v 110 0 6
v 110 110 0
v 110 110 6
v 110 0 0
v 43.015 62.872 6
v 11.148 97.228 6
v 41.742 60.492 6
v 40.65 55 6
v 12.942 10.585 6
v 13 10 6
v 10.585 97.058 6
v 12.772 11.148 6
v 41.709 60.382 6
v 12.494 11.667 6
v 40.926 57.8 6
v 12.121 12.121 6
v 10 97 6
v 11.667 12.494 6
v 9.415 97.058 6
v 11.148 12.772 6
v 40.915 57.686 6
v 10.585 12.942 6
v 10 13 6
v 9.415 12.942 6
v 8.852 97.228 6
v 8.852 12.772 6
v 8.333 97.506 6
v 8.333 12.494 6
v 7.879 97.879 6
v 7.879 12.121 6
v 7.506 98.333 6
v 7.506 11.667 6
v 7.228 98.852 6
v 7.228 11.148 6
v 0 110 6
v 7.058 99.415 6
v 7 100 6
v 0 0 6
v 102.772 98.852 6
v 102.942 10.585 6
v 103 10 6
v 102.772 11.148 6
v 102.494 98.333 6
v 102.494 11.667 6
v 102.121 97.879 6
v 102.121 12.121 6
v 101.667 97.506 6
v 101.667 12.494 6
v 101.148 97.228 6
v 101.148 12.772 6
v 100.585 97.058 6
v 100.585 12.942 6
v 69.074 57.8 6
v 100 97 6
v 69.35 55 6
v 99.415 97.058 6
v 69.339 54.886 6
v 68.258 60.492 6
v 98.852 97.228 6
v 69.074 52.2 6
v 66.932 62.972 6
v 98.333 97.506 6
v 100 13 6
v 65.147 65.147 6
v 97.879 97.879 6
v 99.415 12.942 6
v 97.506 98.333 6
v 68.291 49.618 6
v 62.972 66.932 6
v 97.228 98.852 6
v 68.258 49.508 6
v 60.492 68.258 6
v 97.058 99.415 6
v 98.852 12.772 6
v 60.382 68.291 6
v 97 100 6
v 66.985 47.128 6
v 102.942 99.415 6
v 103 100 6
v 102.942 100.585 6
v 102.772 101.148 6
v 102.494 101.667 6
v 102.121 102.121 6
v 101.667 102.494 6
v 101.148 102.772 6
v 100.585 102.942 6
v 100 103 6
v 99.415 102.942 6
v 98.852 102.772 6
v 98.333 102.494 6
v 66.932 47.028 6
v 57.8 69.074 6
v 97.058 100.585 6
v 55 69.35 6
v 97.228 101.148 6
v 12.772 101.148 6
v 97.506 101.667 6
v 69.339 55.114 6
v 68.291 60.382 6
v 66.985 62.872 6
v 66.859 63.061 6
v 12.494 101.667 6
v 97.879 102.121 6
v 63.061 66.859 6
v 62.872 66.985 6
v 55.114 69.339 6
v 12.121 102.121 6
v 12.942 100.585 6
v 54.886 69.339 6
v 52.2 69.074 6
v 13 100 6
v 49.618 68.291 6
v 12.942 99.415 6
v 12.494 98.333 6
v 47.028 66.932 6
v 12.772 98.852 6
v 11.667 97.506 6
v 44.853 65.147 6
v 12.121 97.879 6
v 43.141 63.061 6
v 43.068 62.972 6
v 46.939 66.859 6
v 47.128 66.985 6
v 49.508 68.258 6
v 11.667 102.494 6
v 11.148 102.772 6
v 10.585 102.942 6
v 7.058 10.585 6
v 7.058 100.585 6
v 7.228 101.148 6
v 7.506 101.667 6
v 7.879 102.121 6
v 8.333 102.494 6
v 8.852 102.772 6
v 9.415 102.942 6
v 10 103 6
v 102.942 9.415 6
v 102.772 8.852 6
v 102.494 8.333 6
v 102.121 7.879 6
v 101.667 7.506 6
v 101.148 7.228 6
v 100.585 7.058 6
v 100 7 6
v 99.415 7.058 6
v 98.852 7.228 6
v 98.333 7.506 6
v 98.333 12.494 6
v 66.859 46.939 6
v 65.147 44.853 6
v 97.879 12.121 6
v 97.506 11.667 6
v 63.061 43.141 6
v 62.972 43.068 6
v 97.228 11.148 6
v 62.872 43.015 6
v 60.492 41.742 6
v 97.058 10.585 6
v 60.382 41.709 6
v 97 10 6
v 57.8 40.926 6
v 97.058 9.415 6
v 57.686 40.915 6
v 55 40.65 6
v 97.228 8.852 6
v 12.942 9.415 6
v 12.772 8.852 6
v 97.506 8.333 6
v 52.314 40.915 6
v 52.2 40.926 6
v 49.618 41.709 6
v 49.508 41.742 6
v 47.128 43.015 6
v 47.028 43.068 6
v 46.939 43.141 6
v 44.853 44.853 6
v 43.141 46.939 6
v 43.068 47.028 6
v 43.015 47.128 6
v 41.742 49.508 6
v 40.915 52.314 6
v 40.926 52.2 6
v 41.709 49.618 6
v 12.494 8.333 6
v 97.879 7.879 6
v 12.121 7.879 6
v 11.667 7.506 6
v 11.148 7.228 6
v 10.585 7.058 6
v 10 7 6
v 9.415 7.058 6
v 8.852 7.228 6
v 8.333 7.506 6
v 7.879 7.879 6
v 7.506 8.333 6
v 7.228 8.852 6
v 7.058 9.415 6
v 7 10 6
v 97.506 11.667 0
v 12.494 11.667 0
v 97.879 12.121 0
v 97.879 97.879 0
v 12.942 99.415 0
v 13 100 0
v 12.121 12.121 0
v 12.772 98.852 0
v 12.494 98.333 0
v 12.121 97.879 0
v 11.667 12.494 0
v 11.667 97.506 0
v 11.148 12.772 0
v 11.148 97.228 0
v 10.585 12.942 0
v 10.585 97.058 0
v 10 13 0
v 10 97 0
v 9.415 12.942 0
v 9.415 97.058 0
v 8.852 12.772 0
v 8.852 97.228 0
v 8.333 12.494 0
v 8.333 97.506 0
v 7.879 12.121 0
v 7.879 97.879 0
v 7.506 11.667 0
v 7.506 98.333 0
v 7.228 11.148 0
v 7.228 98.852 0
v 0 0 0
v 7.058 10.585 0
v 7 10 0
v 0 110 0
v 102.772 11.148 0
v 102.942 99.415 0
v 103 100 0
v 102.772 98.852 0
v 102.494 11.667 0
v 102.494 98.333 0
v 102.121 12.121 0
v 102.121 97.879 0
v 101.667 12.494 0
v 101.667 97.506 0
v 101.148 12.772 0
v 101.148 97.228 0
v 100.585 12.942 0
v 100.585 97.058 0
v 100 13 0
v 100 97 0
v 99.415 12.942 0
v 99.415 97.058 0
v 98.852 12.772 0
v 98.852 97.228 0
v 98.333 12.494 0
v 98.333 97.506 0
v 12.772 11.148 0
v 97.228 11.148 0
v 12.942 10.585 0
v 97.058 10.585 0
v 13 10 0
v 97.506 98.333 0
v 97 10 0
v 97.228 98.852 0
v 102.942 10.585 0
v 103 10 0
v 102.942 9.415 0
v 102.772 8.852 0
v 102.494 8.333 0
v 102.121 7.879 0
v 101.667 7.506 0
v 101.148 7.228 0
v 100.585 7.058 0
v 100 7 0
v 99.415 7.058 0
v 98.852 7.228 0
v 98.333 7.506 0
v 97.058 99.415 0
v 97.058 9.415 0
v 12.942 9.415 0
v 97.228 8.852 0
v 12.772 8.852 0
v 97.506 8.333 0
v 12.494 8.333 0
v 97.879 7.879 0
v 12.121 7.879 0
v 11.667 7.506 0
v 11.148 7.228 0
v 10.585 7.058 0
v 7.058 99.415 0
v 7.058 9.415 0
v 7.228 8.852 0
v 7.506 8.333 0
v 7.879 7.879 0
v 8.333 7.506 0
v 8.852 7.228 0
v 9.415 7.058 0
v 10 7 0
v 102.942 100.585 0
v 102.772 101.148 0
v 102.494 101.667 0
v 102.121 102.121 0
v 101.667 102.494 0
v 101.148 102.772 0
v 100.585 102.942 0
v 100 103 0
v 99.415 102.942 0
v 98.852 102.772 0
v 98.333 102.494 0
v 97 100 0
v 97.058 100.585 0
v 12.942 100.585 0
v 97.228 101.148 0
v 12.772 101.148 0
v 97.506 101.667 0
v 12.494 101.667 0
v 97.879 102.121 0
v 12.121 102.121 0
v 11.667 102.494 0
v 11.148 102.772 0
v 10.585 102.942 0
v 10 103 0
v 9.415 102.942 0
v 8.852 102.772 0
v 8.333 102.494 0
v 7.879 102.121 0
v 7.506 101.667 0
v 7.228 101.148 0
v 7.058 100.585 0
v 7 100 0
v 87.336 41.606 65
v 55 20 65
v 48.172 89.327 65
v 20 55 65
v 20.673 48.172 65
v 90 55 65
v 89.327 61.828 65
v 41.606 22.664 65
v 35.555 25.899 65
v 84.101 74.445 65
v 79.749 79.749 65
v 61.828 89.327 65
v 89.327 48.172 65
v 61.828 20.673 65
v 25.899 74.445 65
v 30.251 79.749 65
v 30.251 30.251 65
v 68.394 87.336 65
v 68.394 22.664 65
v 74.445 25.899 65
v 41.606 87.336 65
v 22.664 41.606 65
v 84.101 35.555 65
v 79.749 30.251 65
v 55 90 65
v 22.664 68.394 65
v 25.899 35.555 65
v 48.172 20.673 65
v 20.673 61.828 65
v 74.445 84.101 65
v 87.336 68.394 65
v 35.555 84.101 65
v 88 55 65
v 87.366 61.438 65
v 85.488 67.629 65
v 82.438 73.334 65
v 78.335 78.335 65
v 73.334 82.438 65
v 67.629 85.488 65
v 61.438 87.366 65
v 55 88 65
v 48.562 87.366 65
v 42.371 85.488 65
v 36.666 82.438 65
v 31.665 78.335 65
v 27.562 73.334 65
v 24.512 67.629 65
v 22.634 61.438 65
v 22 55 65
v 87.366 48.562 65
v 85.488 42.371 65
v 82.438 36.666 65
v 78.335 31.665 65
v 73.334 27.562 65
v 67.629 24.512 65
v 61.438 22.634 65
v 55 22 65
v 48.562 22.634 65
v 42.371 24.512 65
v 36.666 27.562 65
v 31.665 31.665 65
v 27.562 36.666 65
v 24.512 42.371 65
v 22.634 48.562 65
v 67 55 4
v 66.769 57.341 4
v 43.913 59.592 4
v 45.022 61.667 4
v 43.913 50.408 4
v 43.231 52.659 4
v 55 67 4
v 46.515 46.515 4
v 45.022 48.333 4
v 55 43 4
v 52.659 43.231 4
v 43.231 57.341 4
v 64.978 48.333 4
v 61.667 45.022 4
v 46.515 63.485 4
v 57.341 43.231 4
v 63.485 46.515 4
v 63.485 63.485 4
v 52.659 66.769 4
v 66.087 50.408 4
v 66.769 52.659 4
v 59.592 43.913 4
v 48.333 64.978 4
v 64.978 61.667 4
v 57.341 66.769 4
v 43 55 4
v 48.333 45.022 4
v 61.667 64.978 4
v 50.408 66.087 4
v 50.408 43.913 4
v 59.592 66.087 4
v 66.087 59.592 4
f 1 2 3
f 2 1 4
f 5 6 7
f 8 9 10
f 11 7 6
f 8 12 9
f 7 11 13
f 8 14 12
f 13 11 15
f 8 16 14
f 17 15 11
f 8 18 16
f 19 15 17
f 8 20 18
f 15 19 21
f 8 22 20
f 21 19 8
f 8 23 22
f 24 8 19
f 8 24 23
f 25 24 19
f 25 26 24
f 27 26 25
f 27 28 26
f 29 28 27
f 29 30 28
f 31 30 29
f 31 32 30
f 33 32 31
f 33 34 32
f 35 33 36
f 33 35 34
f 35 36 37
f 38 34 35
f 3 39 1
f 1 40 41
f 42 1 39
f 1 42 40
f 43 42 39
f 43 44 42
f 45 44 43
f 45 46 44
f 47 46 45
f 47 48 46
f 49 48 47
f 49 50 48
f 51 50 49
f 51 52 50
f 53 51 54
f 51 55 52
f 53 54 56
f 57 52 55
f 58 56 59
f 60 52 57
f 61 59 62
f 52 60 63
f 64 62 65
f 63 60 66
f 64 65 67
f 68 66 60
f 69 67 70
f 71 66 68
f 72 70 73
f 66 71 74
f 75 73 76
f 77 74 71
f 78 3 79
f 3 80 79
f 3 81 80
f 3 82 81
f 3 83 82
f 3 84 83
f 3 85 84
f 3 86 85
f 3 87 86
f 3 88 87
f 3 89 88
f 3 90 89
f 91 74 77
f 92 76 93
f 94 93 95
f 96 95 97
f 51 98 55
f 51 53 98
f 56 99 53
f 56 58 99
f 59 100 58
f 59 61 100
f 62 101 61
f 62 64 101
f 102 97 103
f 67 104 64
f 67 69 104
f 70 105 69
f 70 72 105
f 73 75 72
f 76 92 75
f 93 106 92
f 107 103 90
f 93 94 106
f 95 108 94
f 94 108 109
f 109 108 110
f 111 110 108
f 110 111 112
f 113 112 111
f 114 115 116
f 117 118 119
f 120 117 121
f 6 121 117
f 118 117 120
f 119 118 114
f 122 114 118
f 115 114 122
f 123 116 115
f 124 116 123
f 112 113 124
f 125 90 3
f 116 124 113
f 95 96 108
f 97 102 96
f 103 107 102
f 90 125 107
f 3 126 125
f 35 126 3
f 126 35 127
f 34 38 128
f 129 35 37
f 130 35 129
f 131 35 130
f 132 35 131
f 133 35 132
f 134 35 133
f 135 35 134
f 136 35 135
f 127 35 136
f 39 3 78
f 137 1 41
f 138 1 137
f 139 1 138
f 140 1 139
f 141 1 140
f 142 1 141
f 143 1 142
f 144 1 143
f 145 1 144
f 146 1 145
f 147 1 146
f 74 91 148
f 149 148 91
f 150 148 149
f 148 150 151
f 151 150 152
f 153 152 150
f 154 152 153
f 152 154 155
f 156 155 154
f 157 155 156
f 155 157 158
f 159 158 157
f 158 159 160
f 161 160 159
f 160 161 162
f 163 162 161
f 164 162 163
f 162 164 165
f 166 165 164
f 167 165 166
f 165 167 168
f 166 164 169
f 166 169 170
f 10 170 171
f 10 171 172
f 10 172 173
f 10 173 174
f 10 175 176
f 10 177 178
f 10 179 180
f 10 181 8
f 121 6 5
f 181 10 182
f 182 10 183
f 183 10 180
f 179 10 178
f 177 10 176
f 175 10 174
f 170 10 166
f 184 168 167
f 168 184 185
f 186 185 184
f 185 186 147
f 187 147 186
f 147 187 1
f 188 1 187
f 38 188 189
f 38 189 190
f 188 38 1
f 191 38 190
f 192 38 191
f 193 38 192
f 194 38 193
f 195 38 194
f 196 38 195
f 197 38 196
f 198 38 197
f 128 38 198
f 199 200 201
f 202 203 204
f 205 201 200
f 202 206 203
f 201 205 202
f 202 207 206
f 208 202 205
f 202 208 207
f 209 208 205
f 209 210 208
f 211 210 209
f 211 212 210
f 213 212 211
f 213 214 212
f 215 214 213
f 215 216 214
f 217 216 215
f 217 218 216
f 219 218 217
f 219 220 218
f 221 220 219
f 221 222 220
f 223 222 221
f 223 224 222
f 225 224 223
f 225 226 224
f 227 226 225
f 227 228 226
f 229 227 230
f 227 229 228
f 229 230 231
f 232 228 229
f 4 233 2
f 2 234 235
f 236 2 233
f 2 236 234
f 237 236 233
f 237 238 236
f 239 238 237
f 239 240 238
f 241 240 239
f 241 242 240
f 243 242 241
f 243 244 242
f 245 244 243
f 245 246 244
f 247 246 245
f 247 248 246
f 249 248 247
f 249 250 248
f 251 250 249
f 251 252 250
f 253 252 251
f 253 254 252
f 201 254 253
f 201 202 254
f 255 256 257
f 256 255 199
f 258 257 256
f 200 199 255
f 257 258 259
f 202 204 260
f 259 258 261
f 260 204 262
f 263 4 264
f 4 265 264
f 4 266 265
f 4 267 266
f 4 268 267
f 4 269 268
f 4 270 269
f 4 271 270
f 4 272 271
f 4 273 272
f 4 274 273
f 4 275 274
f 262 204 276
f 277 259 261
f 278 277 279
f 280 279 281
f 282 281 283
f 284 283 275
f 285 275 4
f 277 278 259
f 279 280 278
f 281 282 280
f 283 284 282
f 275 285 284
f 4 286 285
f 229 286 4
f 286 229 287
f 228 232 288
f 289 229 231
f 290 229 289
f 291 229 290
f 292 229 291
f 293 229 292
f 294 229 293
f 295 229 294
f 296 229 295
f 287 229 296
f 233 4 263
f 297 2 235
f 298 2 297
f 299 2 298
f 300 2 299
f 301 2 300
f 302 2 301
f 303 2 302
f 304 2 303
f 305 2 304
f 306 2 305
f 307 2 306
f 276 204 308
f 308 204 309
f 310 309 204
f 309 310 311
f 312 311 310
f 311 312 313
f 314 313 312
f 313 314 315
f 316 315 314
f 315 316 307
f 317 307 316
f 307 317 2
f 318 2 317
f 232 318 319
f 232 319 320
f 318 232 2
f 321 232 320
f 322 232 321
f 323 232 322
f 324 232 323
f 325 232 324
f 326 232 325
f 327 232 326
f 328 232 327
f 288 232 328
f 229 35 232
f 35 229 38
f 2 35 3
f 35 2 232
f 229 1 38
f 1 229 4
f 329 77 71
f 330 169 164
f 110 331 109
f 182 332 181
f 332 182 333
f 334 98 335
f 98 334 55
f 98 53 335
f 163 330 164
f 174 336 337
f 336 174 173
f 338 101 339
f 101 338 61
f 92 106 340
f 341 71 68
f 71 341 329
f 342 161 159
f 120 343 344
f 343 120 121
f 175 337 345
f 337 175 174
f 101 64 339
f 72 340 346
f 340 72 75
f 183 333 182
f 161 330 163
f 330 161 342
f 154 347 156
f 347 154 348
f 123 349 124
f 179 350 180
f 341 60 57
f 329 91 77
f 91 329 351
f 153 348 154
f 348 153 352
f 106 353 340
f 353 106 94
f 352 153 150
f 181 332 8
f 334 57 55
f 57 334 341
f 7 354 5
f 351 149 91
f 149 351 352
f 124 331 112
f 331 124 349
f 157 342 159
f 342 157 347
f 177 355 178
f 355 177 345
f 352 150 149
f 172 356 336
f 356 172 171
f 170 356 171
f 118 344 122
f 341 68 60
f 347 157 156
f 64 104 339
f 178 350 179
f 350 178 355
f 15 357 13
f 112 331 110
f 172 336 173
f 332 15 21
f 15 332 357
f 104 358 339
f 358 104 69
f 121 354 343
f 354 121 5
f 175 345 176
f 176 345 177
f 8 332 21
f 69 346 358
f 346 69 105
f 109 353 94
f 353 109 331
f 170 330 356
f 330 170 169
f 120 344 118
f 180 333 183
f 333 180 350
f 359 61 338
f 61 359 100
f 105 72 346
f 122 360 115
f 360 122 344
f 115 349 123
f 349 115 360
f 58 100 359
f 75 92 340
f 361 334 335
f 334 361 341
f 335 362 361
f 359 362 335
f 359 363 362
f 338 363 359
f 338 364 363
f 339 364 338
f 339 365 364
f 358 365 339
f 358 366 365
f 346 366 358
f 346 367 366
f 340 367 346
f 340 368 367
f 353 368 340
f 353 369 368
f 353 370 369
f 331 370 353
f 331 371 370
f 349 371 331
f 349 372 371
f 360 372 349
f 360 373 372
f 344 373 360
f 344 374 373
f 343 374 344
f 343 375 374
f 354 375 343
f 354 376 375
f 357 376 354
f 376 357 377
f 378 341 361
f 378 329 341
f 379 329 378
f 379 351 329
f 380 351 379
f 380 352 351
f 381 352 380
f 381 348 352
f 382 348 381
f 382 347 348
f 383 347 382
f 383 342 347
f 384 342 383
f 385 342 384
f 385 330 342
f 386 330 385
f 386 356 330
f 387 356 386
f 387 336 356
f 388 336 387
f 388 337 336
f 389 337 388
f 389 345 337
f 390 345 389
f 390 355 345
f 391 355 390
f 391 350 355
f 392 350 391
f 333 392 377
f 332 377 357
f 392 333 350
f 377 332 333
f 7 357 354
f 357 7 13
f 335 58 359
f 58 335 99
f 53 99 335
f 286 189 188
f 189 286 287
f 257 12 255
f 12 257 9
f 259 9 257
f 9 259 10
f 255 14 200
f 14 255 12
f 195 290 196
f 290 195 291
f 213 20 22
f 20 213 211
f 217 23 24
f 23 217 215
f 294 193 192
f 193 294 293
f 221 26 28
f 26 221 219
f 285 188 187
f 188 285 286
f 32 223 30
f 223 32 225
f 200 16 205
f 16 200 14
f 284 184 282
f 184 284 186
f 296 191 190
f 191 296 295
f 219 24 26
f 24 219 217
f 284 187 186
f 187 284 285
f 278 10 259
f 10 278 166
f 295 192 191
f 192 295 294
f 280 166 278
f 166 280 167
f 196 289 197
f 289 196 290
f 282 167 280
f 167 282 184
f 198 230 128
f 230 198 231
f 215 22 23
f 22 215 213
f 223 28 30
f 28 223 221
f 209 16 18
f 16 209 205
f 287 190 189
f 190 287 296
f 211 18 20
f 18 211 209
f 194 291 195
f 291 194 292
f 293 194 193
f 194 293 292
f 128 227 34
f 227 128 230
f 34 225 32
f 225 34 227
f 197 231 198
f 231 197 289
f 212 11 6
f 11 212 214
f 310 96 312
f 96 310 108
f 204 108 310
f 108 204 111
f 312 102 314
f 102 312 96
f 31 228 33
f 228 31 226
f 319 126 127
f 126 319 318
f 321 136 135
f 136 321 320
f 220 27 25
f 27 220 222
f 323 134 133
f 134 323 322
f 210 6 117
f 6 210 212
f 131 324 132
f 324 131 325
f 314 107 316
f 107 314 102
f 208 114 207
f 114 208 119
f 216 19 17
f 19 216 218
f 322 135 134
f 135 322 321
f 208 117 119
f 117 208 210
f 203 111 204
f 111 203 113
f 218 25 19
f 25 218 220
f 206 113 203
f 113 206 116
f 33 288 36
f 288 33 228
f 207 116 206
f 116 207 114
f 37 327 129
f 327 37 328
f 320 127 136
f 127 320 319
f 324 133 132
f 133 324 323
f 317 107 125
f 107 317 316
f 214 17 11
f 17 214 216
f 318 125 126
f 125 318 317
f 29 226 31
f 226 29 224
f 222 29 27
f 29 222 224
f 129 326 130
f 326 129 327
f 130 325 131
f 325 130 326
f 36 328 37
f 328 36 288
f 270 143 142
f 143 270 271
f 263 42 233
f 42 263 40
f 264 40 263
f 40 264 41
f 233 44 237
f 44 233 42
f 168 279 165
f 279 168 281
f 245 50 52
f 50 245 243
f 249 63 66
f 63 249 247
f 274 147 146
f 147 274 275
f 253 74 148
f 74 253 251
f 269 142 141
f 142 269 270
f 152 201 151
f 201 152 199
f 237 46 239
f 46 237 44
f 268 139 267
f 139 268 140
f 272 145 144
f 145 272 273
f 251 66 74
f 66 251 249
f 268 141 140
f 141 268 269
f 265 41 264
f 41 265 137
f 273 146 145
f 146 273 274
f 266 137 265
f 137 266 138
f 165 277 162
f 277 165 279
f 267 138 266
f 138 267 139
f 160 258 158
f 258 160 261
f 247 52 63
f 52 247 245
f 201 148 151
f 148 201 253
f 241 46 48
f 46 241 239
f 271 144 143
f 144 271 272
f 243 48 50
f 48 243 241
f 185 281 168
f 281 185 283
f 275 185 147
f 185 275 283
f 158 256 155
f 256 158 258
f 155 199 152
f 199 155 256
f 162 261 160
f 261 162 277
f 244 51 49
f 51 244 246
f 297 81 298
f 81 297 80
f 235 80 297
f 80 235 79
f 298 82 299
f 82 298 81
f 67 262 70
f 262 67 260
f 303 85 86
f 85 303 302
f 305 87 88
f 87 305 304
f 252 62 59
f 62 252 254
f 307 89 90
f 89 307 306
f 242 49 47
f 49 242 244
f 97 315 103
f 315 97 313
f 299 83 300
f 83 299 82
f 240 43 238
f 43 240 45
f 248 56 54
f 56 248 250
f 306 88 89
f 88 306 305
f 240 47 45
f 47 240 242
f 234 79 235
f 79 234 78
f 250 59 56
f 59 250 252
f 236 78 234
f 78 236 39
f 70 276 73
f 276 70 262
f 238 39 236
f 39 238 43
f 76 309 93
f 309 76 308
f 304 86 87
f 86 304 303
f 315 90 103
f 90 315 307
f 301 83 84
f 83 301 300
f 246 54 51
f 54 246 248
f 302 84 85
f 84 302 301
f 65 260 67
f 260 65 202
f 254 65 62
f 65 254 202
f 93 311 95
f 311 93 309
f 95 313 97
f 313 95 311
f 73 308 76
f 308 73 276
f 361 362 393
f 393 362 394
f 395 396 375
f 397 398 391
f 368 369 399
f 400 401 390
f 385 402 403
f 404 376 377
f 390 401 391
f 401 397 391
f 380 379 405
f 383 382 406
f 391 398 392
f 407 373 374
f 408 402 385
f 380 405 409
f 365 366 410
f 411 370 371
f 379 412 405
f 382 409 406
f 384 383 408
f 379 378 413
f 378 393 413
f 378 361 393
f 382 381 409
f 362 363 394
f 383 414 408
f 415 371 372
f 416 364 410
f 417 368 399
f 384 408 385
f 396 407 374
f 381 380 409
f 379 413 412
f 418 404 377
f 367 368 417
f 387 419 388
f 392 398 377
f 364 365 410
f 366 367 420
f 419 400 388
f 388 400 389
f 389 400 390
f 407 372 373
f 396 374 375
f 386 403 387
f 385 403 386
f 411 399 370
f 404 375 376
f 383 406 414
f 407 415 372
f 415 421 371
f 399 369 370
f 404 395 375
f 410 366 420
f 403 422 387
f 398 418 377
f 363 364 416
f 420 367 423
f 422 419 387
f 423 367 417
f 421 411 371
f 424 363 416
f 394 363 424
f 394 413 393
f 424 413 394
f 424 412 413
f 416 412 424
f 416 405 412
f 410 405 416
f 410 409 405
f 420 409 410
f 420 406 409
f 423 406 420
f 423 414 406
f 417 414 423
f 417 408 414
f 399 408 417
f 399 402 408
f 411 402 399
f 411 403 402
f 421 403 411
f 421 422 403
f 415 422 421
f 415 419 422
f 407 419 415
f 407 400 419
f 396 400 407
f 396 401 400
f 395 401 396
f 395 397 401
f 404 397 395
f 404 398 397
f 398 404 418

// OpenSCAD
$fn = 32;

// ----------------------------------------------------------------------
// Hopper: flanged with square flange
// ----------------------------------------------------------------------

// --- parameters (mm) ---
fl = 110;                 // flange side, X and Y
fl_t = 6;                 // flange thickness
cone_h = 60;              // cone height above the flange
top_d = 70;               // cone mouth diameter
bot_d = 28;               // cone spout diameter
wall = 2;                 // cone wall thickness
hole_r = 3;               // flange hole radius
hole_in = 10;             // hole inset from the corners
fit_tol = 0.05;           // tolerance for press fits, mm
free_tol = 0.3;           // tolerance for clearance fits, mm

bore_d = bot_d - 2 * wall;  // spout bore diameter
total_h = fl_t + cone_h - 1;  // overall height

difference() {
  union() {
    cube([fl, fl, fl_t]);
    translate([fl / 2, fl / 2, fl_t - 1])
      cylinder(h = cone_h, d1 = bot_d, d2 = top_d);
  }
  translate([fl / 2, fl / 2, fl_t - 2])
    cylinder(h = cone_h + 1, d1 = bore_d, d2 = top_d - 2 * wall);
  for (sx = [0, 1], sy = [0, 1])
    translate([sx ? fl - hole_in : hole_in,
               sy ? fl - hole_in : hole_in, -1])
      cylinder(r = hole_r, h = fl_t + 2);
}
